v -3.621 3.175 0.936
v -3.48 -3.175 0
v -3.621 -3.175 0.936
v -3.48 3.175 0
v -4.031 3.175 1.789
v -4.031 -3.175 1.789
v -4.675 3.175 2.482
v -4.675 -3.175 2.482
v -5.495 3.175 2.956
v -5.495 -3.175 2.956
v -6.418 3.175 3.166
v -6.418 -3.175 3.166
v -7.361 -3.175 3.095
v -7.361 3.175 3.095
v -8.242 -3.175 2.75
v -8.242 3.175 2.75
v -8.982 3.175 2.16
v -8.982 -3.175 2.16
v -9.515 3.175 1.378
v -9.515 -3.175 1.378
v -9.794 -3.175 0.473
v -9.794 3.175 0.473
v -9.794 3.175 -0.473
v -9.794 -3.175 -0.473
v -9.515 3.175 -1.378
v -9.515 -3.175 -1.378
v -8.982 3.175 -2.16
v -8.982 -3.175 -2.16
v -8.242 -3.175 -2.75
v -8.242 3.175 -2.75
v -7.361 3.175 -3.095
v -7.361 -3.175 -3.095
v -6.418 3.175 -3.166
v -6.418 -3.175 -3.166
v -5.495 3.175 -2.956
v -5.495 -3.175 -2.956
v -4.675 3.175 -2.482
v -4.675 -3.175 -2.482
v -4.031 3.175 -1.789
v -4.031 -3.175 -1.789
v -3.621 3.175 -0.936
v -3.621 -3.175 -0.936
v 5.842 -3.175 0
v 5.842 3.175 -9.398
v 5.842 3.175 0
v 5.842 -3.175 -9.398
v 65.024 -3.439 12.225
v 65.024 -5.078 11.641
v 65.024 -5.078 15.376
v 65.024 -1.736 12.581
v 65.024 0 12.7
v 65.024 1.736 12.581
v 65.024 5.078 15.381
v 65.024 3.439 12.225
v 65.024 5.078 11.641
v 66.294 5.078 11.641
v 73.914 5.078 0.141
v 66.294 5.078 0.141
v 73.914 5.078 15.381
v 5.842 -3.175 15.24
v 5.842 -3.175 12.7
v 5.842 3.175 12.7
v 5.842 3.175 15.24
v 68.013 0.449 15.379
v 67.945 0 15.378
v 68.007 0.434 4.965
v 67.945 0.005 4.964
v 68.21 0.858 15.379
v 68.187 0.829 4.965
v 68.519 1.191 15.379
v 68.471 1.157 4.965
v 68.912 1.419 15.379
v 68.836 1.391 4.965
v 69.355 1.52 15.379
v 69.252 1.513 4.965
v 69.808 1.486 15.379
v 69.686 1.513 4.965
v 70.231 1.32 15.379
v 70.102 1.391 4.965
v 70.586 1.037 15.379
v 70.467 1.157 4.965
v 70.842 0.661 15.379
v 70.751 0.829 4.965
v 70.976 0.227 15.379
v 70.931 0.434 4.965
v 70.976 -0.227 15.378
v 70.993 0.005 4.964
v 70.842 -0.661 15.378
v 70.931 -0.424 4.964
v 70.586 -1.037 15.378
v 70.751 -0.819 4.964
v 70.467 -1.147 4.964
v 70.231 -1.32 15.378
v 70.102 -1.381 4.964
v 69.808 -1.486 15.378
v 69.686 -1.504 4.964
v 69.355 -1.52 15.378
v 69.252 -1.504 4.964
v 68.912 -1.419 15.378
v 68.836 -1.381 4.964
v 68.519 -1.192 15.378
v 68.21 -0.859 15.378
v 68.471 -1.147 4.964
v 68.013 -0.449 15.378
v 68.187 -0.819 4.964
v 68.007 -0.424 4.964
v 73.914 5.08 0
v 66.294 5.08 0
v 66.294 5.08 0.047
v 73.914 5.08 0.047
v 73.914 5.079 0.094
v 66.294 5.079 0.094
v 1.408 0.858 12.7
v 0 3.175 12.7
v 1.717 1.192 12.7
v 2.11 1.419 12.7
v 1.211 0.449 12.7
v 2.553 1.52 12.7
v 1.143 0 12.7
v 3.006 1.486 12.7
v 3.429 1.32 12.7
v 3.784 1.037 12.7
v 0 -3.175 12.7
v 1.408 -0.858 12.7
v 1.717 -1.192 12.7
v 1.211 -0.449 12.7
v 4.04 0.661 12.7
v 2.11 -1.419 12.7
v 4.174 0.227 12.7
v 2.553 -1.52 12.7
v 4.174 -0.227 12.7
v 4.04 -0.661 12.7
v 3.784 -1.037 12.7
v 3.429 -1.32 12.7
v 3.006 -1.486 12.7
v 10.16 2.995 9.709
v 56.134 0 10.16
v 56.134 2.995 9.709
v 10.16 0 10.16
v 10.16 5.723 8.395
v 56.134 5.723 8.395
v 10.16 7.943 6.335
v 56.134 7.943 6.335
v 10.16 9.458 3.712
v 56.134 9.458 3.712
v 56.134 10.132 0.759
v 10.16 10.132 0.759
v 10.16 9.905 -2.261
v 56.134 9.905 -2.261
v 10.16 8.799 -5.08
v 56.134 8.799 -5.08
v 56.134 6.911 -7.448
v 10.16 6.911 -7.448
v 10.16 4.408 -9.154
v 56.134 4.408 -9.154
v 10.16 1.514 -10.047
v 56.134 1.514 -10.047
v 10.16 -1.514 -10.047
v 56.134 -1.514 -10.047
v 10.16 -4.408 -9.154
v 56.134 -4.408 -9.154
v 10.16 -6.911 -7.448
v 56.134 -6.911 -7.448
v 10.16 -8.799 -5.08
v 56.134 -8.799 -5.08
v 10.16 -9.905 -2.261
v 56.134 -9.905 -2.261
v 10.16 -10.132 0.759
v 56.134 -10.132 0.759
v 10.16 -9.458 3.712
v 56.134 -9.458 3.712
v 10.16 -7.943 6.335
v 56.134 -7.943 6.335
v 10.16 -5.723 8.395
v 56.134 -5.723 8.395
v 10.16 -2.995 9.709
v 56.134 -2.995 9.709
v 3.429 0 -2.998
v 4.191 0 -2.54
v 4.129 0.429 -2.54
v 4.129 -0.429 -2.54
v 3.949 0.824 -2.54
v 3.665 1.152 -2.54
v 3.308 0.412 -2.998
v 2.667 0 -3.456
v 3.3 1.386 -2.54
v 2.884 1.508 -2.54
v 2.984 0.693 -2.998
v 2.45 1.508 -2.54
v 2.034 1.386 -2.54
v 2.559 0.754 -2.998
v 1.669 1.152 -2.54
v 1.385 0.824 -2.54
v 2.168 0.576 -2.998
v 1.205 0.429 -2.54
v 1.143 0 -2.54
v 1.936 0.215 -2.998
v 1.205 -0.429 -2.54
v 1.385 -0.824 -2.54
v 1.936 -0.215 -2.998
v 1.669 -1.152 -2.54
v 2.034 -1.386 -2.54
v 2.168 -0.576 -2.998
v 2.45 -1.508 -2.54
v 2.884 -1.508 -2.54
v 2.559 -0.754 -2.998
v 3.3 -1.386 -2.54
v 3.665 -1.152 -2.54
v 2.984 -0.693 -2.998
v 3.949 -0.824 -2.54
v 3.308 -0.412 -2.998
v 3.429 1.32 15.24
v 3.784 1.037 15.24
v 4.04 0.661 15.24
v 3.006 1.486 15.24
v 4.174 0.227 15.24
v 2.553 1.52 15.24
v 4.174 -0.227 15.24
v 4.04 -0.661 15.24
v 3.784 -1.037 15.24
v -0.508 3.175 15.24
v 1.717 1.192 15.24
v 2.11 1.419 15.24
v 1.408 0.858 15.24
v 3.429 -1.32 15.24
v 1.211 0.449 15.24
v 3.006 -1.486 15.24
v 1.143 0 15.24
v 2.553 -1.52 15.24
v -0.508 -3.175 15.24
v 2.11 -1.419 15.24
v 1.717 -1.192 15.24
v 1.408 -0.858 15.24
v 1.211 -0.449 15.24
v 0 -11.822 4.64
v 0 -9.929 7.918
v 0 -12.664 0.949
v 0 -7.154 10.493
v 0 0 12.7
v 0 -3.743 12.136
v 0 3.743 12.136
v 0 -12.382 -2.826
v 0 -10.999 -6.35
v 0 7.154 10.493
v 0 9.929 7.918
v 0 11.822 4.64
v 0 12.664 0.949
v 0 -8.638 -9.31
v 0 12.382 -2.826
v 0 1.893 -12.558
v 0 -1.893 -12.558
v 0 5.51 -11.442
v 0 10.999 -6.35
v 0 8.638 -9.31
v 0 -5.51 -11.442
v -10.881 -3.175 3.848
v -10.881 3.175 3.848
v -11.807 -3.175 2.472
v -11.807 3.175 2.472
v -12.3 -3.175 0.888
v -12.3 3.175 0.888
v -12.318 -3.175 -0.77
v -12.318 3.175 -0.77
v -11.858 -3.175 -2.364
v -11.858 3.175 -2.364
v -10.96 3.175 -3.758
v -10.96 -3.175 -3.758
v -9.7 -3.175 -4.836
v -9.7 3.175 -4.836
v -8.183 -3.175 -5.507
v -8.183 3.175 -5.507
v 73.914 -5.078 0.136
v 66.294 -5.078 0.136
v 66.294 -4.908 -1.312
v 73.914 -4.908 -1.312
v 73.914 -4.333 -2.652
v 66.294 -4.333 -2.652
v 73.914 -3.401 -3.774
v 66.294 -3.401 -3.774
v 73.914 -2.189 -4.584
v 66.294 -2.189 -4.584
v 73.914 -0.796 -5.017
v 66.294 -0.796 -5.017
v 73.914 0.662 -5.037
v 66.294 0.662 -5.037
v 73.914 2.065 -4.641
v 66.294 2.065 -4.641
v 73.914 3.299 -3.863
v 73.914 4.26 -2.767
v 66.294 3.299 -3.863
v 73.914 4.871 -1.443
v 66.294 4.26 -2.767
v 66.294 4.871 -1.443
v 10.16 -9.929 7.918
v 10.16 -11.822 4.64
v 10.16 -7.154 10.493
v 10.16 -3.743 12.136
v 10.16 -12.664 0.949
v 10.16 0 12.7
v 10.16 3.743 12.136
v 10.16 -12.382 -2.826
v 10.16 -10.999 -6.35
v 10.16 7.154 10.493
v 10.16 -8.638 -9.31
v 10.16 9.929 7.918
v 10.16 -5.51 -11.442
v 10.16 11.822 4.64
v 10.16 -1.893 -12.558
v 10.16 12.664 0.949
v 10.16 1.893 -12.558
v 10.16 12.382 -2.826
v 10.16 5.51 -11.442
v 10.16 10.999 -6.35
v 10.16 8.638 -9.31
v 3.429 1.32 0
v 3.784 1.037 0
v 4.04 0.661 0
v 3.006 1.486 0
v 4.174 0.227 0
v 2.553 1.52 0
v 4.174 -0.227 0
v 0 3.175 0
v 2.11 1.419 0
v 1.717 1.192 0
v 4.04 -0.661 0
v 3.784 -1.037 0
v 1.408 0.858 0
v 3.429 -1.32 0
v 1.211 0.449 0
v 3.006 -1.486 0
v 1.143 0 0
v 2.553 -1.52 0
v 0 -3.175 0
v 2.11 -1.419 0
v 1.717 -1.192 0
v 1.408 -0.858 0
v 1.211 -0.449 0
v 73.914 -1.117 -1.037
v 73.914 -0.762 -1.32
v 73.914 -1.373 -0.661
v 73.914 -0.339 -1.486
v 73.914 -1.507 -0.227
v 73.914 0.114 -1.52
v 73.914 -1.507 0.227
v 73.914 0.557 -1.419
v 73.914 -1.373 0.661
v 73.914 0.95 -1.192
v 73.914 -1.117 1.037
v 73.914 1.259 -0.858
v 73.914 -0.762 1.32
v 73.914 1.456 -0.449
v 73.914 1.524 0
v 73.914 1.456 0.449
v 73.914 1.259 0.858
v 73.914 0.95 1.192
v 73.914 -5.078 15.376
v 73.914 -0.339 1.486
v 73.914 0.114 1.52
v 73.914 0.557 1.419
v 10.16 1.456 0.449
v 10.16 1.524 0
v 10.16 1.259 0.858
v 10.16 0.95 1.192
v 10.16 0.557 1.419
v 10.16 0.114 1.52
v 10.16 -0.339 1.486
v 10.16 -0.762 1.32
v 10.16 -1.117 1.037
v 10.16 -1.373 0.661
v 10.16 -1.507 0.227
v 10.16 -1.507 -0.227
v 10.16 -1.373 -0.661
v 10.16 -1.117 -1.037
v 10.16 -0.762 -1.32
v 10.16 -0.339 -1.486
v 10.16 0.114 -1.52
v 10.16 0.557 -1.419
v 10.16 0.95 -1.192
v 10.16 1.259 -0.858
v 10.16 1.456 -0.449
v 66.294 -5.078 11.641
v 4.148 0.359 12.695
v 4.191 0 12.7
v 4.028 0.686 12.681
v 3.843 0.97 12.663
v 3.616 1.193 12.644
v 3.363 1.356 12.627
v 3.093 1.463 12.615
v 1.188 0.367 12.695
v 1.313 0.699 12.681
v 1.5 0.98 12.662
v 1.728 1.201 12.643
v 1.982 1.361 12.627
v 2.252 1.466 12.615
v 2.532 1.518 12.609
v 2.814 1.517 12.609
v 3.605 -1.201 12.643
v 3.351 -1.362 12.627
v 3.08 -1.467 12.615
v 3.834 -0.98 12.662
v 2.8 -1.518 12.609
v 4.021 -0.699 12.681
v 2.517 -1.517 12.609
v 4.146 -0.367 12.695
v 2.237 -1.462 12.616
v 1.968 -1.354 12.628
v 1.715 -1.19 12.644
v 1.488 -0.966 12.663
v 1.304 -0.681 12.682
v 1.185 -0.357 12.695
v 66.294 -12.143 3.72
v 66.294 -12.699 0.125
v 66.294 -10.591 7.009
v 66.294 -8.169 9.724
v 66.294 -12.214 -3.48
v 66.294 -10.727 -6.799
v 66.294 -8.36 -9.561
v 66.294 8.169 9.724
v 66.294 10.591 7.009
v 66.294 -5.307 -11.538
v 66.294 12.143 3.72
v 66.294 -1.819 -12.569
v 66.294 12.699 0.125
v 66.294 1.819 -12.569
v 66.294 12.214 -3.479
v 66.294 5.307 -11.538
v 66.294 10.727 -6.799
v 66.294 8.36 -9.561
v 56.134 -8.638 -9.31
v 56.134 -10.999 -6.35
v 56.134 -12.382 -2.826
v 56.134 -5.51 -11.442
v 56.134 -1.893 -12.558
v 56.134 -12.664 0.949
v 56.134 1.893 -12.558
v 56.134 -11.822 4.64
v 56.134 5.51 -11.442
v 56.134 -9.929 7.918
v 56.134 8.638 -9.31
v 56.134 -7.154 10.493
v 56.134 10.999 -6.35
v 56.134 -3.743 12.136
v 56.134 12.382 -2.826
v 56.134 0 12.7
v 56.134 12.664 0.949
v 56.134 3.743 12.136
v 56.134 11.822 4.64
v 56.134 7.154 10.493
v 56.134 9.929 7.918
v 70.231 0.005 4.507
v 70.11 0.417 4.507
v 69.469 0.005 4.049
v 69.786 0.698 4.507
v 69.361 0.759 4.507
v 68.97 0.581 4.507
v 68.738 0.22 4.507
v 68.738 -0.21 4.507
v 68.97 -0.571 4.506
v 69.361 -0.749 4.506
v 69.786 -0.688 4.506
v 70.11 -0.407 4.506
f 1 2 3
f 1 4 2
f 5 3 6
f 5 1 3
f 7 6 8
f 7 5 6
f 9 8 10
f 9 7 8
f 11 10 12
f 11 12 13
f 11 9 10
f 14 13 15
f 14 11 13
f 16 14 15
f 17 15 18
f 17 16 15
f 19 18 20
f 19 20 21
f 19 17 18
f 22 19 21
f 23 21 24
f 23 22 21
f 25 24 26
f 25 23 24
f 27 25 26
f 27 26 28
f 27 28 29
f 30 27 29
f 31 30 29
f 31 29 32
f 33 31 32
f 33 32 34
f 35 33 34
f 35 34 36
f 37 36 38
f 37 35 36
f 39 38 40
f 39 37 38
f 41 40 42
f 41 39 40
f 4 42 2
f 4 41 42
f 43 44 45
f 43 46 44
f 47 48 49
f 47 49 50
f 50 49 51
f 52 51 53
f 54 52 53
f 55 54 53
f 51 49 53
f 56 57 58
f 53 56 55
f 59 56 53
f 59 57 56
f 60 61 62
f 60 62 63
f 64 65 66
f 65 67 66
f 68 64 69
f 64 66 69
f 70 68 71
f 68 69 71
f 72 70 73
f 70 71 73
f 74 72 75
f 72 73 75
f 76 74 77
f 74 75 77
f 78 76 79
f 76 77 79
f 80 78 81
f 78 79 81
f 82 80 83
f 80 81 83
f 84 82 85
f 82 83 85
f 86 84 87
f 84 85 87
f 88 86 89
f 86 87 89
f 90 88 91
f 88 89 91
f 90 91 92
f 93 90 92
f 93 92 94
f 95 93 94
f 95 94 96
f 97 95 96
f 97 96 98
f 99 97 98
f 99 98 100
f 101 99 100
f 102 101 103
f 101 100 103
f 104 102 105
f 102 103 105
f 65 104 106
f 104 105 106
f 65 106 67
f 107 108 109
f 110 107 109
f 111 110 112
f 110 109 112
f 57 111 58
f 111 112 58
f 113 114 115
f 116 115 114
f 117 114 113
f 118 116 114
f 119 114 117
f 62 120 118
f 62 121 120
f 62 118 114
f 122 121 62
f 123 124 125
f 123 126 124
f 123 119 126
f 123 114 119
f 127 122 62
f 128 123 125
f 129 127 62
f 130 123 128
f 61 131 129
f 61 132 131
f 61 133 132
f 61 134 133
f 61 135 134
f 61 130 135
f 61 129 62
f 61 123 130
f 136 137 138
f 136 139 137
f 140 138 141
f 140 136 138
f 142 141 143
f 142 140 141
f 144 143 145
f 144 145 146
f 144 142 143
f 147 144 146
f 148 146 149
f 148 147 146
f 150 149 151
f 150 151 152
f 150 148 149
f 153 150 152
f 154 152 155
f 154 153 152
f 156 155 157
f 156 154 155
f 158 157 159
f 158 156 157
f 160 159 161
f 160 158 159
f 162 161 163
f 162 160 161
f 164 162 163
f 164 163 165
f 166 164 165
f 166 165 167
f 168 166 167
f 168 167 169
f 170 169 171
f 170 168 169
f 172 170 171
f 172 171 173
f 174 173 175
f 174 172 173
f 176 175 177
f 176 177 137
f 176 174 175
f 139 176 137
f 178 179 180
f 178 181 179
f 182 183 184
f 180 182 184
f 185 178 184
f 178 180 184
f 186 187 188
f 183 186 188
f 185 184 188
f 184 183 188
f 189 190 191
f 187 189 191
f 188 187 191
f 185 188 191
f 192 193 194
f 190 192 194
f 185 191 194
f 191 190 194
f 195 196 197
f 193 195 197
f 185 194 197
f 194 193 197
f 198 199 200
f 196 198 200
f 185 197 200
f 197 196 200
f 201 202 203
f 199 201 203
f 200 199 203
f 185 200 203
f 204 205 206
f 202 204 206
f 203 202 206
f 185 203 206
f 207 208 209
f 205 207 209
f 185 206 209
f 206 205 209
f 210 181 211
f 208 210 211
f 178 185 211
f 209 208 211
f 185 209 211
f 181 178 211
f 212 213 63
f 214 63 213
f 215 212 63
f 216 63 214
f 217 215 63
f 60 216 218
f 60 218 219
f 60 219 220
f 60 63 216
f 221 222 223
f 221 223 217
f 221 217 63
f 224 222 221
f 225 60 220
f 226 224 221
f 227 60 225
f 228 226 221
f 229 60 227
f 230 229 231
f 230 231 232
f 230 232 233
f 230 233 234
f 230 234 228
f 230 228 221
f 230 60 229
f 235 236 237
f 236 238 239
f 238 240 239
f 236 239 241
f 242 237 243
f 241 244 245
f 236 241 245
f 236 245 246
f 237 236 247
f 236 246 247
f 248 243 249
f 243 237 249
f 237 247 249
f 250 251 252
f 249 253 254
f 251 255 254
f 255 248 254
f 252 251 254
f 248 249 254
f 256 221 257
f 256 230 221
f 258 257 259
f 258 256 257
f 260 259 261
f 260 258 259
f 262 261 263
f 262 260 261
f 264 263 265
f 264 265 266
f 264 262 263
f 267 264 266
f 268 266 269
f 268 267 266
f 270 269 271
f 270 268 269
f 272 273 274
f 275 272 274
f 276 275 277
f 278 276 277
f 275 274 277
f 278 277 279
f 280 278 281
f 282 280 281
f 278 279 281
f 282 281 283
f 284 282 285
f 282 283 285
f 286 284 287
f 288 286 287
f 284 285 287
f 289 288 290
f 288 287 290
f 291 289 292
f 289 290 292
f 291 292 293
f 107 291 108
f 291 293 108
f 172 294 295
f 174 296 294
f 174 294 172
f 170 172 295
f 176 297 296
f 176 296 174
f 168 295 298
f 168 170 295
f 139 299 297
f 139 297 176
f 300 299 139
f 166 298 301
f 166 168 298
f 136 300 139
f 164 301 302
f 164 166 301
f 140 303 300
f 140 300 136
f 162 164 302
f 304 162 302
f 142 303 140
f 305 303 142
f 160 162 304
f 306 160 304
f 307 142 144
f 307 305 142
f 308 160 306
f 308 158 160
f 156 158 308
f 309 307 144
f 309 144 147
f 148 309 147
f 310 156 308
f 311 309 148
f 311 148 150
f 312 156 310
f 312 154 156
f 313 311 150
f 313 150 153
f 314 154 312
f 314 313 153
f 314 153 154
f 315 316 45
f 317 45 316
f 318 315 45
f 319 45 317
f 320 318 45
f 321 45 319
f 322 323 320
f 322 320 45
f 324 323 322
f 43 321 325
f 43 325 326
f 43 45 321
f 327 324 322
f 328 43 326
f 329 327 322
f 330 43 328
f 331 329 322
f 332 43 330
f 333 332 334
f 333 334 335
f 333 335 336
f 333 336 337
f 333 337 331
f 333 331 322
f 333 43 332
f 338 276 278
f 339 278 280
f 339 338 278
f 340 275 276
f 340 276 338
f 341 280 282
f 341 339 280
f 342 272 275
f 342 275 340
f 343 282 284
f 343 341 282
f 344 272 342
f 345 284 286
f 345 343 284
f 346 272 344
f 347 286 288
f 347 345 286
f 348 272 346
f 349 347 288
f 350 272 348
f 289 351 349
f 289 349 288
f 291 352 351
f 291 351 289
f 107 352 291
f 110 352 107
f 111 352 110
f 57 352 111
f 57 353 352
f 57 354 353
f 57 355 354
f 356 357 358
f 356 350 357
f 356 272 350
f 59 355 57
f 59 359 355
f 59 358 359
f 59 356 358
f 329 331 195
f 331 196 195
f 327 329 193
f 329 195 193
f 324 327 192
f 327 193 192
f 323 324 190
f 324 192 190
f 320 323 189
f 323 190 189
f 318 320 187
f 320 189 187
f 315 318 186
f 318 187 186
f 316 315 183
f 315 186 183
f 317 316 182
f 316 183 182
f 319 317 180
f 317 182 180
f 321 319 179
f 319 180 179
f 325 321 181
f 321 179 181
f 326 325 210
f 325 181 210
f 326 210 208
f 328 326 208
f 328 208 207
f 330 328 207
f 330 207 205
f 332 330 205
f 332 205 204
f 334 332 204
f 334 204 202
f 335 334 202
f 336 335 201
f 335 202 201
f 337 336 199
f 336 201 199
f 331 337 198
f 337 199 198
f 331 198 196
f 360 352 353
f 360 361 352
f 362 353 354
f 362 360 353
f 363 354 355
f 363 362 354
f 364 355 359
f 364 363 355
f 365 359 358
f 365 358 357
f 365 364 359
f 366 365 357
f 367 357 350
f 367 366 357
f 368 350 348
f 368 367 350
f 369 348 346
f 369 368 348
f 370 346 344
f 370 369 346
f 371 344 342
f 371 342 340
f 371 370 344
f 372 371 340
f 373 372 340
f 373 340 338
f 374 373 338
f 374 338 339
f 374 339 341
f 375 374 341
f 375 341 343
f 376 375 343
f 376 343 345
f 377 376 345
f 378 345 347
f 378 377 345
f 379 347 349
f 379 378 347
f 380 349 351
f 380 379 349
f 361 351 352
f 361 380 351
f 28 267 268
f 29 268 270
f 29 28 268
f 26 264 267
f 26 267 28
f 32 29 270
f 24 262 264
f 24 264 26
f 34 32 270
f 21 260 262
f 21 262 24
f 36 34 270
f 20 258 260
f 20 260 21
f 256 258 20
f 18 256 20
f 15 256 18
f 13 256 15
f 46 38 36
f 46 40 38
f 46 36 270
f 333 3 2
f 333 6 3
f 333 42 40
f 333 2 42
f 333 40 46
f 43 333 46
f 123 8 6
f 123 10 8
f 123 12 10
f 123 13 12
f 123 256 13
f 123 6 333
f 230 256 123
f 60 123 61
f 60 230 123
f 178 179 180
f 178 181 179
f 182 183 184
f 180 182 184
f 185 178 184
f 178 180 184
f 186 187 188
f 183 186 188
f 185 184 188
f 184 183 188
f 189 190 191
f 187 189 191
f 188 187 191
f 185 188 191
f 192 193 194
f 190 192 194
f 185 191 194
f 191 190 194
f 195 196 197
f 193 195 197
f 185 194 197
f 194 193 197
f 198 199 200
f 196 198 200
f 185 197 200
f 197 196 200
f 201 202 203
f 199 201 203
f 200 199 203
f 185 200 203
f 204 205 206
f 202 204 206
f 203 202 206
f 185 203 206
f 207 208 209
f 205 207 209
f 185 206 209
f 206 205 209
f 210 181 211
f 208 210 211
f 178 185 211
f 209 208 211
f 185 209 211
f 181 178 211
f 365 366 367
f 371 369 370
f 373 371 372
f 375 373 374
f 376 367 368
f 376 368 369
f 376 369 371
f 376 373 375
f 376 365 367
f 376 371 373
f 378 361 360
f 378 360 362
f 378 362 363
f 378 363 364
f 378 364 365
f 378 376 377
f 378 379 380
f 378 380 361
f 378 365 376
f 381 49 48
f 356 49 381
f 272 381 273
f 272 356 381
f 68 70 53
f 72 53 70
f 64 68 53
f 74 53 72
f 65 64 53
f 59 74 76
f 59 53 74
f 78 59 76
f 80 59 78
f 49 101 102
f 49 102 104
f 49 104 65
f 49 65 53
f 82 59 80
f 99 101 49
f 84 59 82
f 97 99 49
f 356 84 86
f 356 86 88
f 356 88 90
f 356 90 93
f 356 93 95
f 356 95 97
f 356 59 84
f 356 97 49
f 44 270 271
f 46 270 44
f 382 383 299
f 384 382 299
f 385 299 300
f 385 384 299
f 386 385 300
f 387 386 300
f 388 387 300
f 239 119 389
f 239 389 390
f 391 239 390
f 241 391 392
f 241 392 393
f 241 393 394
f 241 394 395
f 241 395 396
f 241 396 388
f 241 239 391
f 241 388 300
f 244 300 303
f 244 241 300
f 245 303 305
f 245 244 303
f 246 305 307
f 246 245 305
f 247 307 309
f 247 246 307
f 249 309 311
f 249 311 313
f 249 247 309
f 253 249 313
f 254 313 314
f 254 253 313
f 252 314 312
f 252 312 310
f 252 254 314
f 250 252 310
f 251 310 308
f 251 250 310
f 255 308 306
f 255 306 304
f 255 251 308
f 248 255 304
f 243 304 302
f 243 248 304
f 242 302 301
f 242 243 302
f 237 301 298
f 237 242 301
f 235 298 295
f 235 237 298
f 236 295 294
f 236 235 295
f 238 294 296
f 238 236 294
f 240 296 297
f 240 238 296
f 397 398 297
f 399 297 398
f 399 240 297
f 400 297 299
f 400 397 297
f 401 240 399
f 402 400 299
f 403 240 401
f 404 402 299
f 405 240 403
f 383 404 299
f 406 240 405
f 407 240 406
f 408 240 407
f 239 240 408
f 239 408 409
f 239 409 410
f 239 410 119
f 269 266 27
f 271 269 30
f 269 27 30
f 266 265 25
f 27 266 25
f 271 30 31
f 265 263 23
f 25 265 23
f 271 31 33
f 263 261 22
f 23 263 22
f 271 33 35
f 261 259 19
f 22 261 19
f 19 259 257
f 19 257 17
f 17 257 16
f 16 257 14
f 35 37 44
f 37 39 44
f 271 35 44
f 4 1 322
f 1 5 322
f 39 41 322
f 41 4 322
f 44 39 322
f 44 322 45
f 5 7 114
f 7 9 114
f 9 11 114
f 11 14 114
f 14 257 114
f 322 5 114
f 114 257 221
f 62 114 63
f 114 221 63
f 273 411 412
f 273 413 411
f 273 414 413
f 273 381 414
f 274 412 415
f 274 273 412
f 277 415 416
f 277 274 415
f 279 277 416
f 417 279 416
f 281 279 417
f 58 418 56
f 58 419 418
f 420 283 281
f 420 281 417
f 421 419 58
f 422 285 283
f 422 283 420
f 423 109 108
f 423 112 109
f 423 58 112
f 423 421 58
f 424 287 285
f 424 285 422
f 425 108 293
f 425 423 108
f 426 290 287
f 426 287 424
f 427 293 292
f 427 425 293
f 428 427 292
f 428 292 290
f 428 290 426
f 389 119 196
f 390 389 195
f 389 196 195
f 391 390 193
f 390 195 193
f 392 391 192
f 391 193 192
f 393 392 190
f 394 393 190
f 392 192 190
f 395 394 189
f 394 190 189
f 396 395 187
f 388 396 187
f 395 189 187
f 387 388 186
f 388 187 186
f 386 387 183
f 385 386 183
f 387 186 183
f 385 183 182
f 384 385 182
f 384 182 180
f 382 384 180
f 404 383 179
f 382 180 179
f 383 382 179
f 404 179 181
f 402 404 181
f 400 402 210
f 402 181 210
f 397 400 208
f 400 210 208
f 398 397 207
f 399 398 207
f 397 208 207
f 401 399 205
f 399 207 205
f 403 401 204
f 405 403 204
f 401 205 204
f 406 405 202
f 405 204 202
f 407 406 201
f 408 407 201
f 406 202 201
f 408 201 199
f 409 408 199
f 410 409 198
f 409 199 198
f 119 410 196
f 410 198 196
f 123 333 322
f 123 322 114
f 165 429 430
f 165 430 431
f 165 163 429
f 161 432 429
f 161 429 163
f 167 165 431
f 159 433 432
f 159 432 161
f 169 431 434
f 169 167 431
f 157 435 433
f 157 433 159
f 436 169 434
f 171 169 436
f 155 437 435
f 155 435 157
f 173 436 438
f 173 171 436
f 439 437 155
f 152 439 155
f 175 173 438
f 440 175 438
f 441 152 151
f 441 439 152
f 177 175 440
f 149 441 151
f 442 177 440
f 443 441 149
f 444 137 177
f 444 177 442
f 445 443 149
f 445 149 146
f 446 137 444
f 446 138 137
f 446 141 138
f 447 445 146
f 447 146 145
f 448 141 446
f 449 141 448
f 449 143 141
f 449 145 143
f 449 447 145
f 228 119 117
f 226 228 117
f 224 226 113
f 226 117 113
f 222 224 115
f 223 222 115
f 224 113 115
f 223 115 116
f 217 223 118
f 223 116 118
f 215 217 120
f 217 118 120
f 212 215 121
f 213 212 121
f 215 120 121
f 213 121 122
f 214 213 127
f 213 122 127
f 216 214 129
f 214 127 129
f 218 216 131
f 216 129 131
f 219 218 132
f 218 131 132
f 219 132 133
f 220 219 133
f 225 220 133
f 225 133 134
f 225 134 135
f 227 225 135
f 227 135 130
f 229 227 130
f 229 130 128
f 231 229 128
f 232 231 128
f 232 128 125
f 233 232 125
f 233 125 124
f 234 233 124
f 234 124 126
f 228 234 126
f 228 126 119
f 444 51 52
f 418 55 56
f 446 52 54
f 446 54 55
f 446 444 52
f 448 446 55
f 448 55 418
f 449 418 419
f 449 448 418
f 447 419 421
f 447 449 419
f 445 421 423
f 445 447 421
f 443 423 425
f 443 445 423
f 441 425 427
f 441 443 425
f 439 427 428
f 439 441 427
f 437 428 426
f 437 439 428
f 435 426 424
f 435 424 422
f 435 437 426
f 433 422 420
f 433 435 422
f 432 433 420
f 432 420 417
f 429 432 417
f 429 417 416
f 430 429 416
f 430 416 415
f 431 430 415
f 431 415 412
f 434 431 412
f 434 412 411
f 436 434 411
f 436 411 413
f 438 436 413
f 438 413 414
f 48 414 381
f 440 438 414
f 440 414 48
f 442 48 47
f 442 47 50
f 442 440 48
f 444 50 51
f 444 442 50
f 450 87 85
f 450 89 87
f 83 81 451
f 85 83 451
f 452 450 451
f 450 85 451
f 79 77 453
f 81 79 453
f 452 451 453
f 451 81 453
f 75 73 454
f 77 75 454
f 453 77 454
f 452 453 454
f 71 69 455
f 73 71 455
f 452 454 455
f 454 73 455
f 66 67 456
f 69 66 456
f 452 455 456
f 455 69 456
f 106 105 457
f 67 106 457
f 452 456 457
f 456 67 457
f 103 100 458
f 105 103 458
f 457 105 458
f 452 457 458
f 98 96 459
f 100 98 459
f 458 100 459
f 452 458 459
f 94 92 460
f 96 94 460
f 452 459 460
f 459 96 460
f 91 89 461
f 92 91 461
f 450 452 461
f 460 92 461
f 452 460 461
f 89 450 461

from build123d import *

# Parameters (mm, degrees)
F0_W          = 5.842
F0_H          = 12.7
F0_R          = 3.175
F2_DEPTH      = 3.175
F3_R          = 1.524
F4_DEPTH      = 7.62
F4_DEPTH_BACK = 1.27
F5_DEPTH      = 56.134
F7_D          = 3.048
F7_DEPTH      = 10.414
F7_TIP        = 0.9157115834
F9_D          = 3.048
F9_DEPTH      = 17.78
F9_TIP        = 0.9157115834
F9_2_D        = 3.048
F9_2_DEPTH    = 17.78
F9_2_TIP      = 0.9157115834


with BuildPart() as f1:
    # F0 (on Front) → F1 (revolve)
    with BuildSketch(Plane.XZ):
        Polygon((5.842, 12.7), (5.842, 0), (66.294, 0), (66.294, 12.7), (56.134, 12.7), (56.134, 10.16), (10.16, 10.16), (10.16, 12.7), align=None)
        with Locations((2.921, 6.35)):
            Rectangle(F0_W, F0_H)
    revolve(axis=Axis((33.147, 0, 0), (-1, 0, 0)))

    # F3 (on face) → F4 (join, two sides)
    with BuildSketch(Plane.YZ.offset(66.294)) as f4_sk:
        with BuildLine():
            ThreePointArc((-5.0781774391, 0.1360657812), (-0.0680389935, -5.0795443393), (5.08, 0))
            ThreePointArc((5.08, 0), (5.0795115412, 0.0704450318), (5.0780462589, 0.1408765166))
            ThreePointArc((5.0780462589, 0.1408765166), (-0.0024062618, 5.0799994301), (-5.0781774391, 0.1360657812))
        make_face()
        Circle(F3_R, mode=Mode.SUBTRACT)
        with BuildLine():
            ThreePointArc((-5.0781774391, 0.1360657812), (-0.0024062618, 5.0799994301), (5.0780462589, 0.1408765166))
            Line((5.0780462589, 0.1408765166), (5.0780462589, 11.6405947525))
            ThreePointArc((5.0780462589, 11.6405947525), (-7.15596e-05, 12.6999999998), (-5.0781774391, 11.6405375261))
            Line((-5.0781774391, 11.6405375261), (-5.0781774391, 0.1360657812))
        make_face()
        with BuildLine():
            ThreePointArc((-5.0781774391, 11.6405375261), (-7.15596e-05, 12.6999999998), (5.0780462589, 11.6405947525))
            Line((5.0780462589, 11.6405947525), (5.0780462589, 15.3808765166))
            Line((5.0780462589, 15.3808765166), (-5.0781774391, 15.3760657812))
            Line((-5.0781774391, 15.3760657812), (-5.0781774391, 11.6405375261))
        make_face()
    extrude(amount=F4_DEPTH)
    extrude(f4_sk.sketch, amount=-F4_DEPTH_BACK)

    # F5 (cut, through all): a face of the model
    f5_faces = [f1.faces().sort_by_distance(p)[0] for p in [
        (66.294, 0, 0),
    ]]
    extrude(f5_faces, amount=-F5_DEPTH, mode=Mode.SUBTRACT)

    # F7
    with Locations(Plane(origin=(0, -0.0072843748, 15.3784677295), x_dir=(1, 0, 0), z_dir=(0, -0.0004736736, 0.9999998878))):
        with Locations((69.469, 0.0072187854)):
            Hole(F7_D / 2, depth=F7_DEPTH)
            with Locations((0, 0, -(F7_DEPTH + F7_TIP / 2))):  # 118° drill point
                Cone(0, F7_D / 2, F7_TIP, mode=Mode.SUBTRACT)

    # F9
    with Locations(Plane.XY.offset(15.24)):
        with Locations((2.667, 0)):
            Hole(F9_D / 2, depth=F9_DEPTH)
            with Locations((0, 0, -(F9_DEPTH + F9_TIP / 2))):  # 118° drill point
                Cone(0, F9_D / 2, F9_TIP, mode=Mode.SUBTRACT)


with BuildPart() as f2:
    # F0 (on Front) → F2 (new body, symmetric)
    with BuildSketch(Plane.XZ):
        with BuildLine():
            Line((5.842, 0), (0, 0))
            Line((0, 0), (-0.9398, 0))
            ThreePointArc((-0.9398, 0), (-3.1957909266, -4.5493385486), (-8.1826630726, -5.5069827884))
            Line((-8.1826630726, -5.5069827884), (5.842, -9.398))
            Line((5.842, -9.398), (5.842, 0))
        make_face()
        with BuildLine():
            Line((-0.9398, 0), (0, 0))
            Line((0, 0), (0, 12.7))
            Line((0, 12.7), (5.842, 12.7))
            Line((5.842, 12.7), (5.842, 15.24))
            Line((5.842, 15.24), (-0.508, 15.24))
            Line((-0.508, 15.24), (-10.8806298187, 3.8475430269))
            ThreePointArc((-10.8806298187, 3.8475430269), (-4.5919612295, 5.3297205562), (-0.9398, 0))
        make_face()
        with BuildLine():
            ThreePointArc((-8.1826630726, -5.5069827884), (-3.1957909266, -4.5493385486), (-0.9398, 0))
            ThreePointArc((-0.9398, 0), (-4.5919612295, 5.3297205562), (-10.8806298187, 3.8475430269))
            ThreePointArc((-10.8806298187, 3.8475430269), (-12.1459778134, -1.5837270034), (-8.1826630726, -5.5069827884))
        make_face()
        with Locations((-6.6548, 0)):
            Circle(F0_R, mode=Mode.SUBTRACT)
    extrude(amount=F2_DEPTH, both=True)

    # F9#2
    with Locations(Plane.XY.offset(15.24)):
        with Locations((2.667, 0)):
            Hole(F9_2_D / 2, depth=F9_2_DEPTH)
            with Locations((0, 0, -(F9_2_DEPTH + F9_2_TIP / 2))):  # 118° drill point
                Cone(0, F9_2_D / 2, F9_2_TIP, mode=Mode.SUBTRACT)


solid = Compound([f1.part, f2.part])
